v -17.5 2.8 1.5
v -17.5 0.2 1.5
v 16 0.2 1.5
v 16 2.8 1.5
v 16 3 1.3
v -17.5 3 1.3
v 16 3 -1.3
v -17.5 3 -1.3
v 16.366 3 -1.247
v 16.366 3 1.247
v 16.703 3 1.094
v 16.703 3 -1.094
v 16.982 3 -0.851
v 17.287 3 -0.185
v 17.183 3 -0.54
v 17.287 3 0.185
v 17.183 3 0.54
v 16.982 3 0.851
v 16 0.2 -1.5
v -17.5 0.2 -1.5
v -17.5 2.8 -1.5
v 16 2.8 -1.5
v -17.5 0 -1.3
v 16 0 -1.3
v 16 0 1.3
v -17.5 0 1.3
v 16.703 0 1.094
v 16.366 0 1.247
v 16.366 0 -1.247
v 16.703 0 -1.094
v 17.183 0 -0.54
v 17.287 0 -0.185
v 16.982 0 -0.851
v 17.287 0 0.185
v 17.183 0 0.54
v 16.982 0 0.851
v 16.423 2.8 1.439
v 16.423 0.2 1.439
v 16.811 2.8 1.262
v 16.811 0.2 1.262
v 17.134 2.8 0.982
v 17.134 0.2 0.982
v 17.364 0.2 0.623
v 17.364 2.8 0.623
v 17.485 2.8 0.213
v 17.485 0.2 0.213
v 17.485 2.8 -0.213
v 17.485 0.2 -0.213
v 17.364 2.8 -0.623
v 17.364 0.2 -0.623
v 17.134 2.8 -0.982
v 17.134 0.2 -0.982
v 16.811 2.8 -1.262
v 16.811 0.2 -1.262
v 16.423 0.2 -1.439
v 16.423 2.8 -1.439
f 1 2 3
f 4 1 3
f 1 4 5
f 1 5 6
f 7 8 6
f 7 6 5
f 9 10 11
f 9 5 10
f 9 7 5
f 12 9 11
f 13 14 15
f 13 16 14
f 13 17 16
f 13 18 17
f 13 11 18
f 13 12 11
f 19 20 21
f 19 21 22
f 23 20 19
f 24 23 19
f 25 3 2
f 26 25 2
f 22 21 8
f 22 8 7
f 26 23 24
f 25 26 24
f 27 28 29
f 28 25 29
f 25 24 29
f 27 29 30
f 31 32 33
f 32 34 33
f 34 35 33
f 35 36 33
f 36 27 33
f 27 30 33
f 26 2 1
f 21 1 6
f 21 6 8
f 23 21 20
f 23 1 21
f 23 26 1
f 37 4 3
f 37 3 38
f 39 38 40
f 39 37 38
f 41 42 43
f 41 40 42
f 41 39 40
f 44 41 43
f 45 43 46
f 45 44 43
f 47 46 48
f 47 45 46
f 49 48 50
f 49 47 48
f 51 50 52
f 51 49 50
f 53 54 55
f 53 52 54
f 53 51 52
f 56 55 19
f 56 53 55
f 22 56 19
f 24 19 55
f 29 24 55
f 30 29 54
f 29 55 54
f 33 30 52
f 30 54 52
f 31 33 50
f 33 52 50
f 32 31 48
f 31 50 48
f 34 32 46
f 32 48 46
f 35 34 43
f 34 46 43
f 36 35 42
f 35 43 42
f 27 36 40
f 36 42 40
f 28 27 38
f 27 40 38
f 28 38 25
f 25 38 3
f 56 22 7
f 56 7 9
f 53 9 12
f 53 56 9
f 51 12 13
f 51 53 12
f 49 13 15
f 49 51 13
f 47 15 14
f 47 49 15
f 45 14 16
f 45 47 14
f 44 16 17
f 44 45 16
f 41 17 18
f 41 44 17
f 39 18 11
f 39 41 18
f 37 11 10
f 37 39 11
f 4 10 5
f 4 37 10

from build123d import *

# Parameters (mm, degrees)
SKETCH1_W           = 35
SKETCH1_H           = 3
BOSS_EXTRUDE1_DEPTH = 3
FILLET2_RADIUS      = 1.5
FILLET2_LENGTH      = 3
CHAMFER2_SIZE       = 0.2


with BuildPart() as part:
    # Sketch1 → Boss-Extrude1 (new body)
    with BuildSketch(Plane(origin=(0, 0, 0), x_dir=(1, 0, 0), z_dir=(0, 1, 0))):
        Rectangle(SKETCH1_W, SKETCH1_H)
    extrude(amount=BOSS_EXTRUDE1_DEPTH)

    # Fillet2: full round fillet: the end face becomes a half cylinder, R = half its width
    fillet2_face = Plane((17.5, 1.5, 0), x_dir=(0, 1, 0), z_dir=(1, 0, 0))  # on the end face: x along it, z out of the body
    fillet2_slab = fillet2_face.offset(-FILLET2_RADIUS / 2) * Box(FILLET2_LENGTH, 2 * FILLET2_RADIUS, FILLET2_RADIUS, mode=Mode.PRIVATE)  # the body's end, R deep
    fillet2_round = Plane((16, 1.5, 0), x_dir=(1, 0, 0), z_dir=(0, 1, 0)) * Cylinder(FILLET2_RADIUS, FILLET2_LENGTH, mode=Mode.PRIVATE)  # its axis R under the face
    add(fillet2_slab - fillet2_round, mode=Mode.SUBTRACT)

    # Chamfer2
    chamfer2_edges = [part.edges().sort_by_distance(p)[0] for p in [
        (-0.75, 0, -1.5),
        (-0.75, 3, -1.5),
        (17.5, 0, 0),
        (17.5, 3, 0),
        (-0.75, 0, 1.5),
        (-0.75, 3, 1.5),
    ]]
    chamfer(chamfer2_edges, length=CHAMFER2_SIZE)


solid = part.part
